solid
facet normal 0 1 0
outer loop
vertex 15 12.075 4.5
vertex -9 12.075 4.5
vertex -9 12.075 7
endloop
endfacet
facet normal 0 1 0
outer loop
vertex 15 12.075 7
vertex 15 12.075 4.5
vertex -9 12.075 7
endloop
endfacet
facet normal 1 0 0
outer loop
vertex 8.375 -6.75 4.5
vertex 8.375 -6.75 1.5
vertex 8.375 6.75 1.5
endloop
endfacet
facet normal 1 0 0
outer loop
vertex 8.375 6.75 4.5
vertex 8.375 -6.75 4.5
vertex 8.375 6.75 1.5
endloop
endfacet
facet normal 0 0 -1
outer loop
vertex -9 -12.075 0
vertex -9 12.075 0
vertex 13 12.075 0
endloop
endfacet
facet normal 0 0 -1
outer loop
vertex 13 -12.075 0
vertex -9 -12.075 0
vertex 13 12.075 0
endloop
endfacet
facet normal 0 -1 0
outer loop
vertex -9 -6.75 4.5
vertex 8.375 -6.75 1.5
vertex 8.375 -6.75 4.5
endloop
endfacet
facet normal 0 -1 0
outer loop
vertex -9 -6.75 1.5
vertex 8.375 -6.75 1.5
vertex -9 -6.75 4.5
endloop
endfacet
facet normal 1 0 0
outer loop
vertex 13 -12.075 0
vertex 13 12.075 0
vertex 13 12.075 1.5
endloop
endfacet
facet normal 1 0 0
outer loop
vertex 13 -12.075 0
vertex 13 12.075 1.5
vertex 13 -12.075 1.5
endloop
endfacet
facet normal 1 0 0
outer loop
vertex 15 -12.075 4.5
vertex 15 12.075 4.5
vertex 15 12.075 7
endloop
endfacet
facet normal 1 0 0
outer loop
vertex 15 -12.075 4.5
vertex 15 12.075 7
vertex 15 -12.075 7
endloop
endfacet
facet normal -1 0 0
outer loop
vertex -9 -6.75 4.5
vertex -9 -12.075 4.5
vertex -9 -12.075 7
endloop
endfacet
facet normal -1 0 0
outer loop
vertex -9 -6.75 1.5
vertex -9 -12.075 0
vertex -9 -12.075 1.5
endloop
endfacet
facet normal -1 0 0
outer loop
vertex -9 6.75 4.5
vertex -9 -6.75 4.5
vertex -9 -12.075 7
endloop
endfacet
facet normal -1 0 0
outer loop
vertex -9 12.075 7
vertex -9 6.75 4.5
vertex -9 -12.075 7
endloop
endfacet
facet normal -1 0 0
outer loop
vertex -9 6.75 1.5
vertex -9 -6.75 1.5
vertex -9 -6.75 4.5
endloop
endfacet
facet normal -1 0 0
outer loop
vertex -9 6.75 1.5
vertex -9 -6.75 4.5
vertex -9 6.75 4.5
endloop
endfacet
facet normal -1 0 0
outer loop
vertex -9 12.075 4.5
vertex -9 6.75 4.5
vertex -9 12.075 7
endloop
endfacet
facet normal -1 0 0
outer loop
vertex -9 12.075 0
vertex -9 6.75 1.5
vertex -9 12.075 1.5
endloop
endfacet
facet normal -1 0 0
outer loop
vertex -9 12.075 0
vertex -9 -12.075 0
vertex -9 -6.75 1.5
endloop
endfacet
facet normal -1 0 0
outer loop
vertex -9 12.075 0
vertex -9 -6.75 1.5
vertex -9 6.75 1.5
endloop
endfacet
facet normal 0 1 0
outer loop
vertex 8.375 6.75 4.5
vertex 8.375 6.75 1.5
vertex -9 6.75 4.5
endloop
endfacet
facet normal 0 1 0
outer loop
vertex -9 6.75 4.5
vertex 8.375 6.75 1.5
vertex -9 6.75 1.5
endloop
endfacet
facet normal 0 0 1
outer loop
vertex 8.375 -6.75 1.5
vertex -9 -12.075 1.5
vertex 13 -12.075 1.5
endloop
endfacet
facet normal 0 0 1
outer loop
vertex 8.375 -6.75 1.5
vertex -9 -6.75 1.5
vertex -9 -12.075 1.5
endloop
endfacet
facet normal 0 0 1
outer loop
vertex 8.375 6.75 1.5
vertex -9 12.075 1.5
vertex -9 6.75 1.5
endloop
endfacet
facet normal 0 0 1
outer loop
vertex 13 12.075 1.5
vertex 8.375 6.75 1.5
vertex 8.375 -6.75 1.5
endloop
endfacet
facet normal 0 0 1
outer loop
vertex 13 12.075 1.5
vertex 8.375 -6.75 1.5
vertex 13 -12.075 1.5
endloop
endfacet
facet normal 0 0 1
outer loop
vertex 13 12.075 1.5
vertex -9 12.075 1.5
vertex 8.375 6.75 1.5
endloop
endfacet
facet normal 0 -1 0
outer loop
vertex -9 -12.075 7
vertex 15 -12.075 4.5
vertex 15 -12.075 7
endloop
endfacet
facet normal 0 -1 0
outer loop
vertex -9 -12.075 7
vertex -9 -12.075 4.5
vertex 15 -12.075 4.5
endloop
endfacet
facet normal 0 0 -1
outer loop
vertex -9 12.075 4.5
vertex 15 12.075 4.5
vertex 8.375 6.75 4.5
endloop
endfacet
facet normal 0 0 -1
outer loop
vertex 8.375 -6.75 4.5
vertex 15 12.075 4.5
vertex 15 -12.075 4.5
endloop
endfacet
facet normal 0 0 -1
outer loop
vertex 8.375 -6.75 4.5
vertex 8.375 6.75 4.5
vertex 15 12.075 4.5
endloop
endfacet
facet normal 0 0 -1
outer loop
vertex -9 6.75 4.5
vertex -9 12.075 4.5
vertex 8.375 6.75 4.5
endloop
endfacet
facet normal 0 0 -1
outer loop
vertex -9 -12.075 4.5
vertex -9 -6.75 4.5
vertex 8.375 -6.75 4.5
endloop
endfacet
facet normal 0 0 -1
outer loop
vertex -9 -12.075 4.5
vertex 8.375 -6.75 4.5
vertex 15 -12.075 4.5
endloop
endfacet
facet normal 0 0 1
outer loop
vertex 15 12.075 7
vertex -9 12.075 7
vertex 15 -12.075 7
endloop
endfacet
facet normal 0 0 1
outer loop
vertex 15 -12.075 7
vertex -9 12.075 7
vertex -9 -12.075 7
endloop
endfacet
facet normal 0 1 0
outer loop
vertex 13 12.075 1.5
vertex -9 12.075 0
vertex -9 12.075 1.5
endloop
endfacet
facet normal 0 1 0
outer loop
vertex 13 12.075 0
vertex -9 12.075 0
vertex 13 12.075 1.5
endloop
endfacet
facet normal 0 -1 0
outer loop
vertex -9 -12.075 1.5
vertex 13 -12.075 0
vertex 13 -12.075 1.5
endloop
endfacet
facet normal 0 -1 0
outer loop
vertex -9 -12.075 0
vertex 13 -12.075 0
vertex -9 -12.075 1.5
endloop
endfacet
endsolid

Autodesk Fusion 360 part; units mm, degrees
sketch "Sketch1" plane through (0, 0, 0) normal (0, 0, 1) x (1, 0, 0)
  line L0 (8.375, 6.75) -> (-8.375, 6.75)
  line L1 (-8.375, -6.75) -> (8.375, -6.75)
  line L2 (8.375, -6.75) -> (8.375, 6.75)
  line L3 (8.375, 6.75) -> (-8.375, -6.75) construction
  line L4 (-8.375, 6.75) -> (8.375, -6.75) construction
  line L5 (-9, 12.0754) -> (13, 12.0754)
  line L6 (13, 12.0754) -> (13, -12.0754)
  line L7 (13, -12.0754) -> (-9, -12.0754)
  line L8 (-9, -12.0754) -> (-9, 12.0754)
  line L9 (-9, 12.0754) -> (13, -12.0754) construction
  line L10 (13, 12.0754) -> (-9, -12.0754) construction
  line L11 (-8.375, -6.75) -> (-9, -6.75)
  line L12 (-8.375, 6.75) -> (-9, 6.75)
  point P0 (2, 0)
  dimension "d1" = 16.75
  dimension "d2" = 13.5
extrude "Extrude1" add sketch "Sketch1" along normal blind 7
extrude "Extrude2" cut sketch "Sketch1" along normal blind 4.5 and the other way blind -1.5 contours L0 L1 L2 L5 L6 L7 L8 L11 L12
extrude "Extrude3" add 1 faces at (13, 4.0251, 6.1667) along direction (1, 0, 0) blind 2
